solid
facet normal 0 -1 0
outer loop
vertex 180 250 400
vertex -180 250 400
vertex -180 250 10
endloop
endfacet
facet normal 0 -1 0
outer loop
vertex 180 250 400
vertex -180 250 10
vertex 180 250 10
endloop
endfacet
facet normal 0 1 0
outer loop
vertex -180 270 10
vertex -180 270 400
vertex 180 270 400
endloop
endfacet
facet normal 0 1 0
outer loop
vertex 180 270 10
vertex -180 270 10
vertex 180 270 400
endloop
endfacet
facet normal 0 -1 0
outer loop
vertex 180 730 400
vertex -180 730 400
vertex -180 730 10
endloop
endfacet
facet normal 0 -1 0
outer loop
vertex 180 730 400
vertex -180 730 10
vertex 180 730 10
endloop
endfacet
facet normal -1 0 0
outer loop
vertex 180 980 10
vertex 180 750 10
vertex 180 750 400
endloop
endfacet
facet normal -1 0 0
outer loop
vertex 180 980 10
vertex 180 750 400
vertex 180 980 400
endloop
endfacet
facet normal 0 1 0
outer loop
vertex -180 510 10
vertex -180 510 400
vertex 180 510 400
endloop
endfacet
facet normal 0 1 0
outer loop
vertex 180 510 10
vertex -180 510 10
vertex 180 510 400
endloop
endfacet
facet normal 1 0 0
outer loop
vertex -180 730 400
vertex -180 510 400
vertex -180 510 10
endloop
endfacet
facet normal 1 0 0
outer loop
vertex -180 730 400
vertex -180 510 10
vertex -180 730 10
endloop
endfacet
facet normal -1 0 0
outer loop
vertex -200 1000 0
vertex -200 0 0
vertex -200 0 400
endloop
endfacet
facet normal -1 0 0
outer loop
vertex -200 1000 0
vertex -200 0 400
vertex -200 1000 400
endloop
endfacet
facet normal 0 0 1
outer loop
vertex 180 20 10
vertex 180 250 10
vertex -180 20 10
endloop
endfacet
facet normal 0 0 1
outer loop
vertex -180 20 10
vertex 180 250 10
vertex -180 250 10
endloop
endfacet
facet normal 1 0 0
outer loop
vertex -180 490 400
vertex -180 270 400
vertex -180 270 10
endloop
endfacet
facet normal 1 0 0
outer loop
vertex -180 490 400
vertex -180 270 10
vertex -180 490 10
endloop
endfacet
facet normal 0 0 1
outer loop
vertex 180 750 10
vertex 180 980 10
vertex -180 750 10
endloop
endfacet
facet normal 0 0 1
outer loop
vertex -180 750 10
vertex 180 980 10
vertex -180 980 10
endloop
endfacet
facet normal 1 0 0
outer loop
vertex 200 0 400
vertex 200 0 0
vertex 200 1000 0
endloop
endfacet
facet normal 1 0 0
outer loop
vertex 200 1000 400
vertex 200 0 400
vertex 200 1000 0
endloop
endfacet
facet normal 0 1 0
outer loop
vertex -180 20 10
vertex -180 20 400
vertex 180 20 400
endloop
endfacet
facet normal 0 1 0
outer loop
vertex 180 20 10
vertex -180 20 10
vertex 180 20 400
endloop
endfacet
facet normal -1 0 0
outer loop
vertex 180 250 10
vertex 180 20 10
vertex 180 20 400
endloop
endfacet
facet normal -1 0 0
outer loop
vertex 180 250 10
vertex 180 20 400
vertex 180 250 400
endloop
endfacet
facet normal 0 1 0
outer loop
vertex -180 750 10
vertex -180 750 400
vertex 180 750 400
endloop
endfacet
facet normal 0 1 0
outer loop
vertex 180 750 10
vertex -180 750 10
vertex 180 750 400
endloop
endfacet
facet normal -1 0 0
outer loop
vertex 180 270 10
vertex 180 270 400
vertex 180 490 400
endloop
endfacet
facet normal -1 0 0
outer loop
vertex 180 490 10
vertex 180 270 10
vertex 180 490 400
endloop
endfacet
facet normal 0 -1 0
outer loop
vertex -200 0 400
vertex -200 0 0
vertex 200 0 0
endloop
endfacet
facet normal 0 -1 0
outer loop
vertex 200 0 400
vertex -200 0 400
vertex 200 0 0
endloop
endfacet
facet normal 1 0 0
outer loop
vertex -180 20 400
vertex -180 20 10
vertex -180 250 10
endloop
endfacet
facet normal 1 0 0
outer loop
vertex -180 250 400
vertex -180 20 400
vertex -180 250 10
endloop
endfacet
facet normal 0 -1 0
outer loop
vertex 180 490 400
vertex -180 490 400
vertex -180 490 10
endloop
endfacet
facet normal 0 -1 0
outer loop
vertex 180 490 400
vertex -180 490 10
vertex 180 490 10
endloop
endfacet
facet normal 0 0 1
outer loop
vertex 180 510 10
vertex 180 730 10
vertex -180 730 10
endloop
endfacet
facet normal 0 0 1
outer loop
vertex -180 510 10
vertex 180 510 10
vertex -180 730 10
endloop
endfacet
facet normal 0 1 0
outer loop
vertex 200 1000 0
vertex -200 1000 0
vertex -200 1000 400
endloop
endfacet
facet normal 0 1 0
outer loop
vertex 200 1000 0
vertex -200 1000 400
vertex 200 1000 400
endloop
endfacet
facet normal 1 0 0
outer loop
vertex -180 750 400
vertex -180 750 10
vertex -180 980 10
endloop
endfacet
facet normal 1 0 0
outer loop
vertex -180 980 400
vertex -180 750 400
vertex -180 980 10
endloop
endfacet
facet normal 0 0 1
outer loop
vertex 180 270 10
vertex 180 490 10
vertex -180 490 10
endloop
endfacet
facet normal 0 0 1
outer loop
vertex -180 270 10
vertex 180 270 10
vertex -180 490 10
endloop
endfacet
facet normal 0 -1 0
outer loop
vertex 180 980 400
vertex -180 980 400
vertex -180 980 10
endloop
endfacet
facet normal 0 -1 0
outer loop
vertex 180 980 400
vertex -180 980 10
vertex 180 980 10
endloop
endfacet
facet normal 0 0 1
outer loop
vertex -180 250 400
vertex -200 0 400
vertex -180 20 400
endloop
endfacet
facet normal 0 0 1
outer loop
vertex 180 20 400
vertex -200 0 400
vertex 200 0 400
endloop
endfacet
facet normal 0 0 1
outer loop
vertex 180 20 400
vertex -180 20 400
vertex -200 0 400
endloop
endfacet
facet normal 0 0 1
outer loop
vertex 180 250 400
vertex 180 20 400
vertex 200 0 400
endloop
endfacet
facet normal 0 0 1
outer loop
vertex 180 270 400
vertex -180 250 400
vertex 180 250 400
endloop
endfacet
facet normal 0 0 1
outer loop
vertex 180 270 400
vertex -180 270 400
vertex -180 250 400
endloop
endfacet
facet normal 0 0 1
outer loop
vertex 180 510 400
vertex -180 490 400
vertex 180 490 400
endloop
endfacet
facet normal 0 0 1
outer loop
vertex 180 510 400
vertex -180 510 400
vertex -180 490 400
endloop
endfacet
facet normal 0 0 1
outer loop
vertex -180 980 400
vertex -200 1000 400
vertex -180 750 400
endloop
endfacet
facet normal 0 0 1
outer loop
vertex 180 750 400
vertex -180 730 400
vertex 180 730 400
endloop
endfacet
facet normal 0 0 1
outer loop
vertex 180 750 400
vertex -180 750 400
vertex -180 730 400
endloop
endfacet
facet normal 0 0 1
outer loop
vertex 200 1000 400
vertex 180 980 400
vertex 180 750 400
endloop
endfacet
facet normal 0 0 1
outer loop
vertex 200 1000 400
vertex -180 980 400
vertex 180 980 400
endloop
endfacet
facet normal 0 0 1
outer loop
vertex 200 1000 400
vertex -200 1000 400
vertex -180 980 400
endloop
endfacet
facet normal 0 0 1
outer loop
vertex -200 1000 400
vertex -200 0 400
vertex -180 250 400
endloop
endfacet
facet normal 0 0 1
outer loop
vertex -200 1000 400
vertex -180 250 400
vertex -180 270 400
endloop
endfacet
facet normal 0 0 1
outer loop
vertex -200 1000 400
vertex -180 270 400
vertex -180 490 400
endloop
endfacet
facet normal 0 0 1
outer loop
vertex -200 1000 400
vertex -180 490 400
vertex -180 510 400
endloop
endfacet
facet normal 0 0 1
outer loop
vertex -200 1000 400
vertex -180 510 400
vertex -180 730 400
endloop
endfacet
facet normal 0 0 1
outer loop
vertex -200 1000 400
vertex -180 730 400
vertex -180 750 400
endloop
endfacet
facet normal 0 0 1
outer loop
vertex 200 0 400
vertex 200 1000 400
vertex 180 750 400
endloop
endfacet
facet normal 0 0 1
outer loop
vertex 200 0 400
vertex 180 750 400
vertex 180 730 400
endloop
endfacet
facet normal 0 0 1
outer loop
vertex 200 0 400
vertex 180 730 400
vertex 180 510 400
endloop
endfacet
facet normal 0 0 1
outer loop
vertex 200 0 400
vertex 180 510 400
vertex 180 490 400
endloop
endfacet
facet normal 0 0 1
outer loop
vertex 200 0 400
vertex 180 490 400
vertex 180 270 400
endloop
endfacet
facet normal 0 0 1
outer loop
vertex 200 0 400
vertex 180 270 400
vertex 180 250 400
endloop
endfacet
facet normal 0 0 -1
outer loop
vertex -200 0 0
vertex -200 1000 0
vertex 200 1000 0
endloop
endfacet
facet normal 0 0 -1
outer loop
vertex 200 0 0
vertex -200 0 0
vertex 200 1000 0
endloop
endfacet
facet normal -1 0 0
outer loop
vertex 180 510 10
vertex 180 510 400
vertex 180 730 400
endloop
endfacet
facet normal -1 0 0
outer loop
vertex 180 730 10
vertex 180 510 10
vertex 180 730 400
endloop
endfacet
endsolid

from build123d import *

# Parameters (mm, degrees)
SKETCH1_W           = 400
SKETCH1_H           = 1000
SKETCH1_W_2         = 360
SKETCH1_H_2         = 960
SKETCH1_H_3         = 20
BOSS_EXTRUDE1_DEPTH = 400
SKETCH2_W           = 400
SKETCH2_H           = 1000
BOSS_EXTRUDE2_DEPTH = 10


with BuildPart() as part:
    # Sketch1 → Boss-Extrude1 (new body)
    # profile 1 of 4: a face of its own
    with BuildSketch(Plane.XY):
        with Locations((0, 500)):
            Rectangle(SKETCH1_W, SKETCH1_H)
        with Locations((0, 500)):
            Rectangle(SKETCH1_W_2, SKETCH1_H_2, mode=Mode.SUBTRACT)
    # profile 2 of 4: a face of its own
    with BuildSketch(Plane.XY):
        with Locations((0, 740)):
            Rectangle(SKETCH1_W_2, SKETCH1_H_3)
    # profile 3 of 4: a face of its own
    with BuildSketch(Plane.XY):
        with Locations((0, 500)):
            Rectangle(SKETCH1_W_2, SKETCH1_H_3)
    # profile 4 of 4: a face of its own
    with BuildSketch(Plane.XY):
        with Locations((0, 260)):
            Rectangle(SKETCH1_W_2, SKETCH1_H_3)
    extrude(amount=BOSS_EXTRUDE1_DEPTH)

    # Sketch2 → Boss-Extrude2 (add)
    with BuildSketch(Plane(origin=(0, 0, 0), x_dir=(-1, 0, 0), z_dir=(0, 0, -1))):
        with Locations((0, 500)):
            Rectangle(SKETCH2_W, SKETCH2_H)
    extrude(amount=-BOSS_EXTRUDE2_DEPTH)


solid = part.part
